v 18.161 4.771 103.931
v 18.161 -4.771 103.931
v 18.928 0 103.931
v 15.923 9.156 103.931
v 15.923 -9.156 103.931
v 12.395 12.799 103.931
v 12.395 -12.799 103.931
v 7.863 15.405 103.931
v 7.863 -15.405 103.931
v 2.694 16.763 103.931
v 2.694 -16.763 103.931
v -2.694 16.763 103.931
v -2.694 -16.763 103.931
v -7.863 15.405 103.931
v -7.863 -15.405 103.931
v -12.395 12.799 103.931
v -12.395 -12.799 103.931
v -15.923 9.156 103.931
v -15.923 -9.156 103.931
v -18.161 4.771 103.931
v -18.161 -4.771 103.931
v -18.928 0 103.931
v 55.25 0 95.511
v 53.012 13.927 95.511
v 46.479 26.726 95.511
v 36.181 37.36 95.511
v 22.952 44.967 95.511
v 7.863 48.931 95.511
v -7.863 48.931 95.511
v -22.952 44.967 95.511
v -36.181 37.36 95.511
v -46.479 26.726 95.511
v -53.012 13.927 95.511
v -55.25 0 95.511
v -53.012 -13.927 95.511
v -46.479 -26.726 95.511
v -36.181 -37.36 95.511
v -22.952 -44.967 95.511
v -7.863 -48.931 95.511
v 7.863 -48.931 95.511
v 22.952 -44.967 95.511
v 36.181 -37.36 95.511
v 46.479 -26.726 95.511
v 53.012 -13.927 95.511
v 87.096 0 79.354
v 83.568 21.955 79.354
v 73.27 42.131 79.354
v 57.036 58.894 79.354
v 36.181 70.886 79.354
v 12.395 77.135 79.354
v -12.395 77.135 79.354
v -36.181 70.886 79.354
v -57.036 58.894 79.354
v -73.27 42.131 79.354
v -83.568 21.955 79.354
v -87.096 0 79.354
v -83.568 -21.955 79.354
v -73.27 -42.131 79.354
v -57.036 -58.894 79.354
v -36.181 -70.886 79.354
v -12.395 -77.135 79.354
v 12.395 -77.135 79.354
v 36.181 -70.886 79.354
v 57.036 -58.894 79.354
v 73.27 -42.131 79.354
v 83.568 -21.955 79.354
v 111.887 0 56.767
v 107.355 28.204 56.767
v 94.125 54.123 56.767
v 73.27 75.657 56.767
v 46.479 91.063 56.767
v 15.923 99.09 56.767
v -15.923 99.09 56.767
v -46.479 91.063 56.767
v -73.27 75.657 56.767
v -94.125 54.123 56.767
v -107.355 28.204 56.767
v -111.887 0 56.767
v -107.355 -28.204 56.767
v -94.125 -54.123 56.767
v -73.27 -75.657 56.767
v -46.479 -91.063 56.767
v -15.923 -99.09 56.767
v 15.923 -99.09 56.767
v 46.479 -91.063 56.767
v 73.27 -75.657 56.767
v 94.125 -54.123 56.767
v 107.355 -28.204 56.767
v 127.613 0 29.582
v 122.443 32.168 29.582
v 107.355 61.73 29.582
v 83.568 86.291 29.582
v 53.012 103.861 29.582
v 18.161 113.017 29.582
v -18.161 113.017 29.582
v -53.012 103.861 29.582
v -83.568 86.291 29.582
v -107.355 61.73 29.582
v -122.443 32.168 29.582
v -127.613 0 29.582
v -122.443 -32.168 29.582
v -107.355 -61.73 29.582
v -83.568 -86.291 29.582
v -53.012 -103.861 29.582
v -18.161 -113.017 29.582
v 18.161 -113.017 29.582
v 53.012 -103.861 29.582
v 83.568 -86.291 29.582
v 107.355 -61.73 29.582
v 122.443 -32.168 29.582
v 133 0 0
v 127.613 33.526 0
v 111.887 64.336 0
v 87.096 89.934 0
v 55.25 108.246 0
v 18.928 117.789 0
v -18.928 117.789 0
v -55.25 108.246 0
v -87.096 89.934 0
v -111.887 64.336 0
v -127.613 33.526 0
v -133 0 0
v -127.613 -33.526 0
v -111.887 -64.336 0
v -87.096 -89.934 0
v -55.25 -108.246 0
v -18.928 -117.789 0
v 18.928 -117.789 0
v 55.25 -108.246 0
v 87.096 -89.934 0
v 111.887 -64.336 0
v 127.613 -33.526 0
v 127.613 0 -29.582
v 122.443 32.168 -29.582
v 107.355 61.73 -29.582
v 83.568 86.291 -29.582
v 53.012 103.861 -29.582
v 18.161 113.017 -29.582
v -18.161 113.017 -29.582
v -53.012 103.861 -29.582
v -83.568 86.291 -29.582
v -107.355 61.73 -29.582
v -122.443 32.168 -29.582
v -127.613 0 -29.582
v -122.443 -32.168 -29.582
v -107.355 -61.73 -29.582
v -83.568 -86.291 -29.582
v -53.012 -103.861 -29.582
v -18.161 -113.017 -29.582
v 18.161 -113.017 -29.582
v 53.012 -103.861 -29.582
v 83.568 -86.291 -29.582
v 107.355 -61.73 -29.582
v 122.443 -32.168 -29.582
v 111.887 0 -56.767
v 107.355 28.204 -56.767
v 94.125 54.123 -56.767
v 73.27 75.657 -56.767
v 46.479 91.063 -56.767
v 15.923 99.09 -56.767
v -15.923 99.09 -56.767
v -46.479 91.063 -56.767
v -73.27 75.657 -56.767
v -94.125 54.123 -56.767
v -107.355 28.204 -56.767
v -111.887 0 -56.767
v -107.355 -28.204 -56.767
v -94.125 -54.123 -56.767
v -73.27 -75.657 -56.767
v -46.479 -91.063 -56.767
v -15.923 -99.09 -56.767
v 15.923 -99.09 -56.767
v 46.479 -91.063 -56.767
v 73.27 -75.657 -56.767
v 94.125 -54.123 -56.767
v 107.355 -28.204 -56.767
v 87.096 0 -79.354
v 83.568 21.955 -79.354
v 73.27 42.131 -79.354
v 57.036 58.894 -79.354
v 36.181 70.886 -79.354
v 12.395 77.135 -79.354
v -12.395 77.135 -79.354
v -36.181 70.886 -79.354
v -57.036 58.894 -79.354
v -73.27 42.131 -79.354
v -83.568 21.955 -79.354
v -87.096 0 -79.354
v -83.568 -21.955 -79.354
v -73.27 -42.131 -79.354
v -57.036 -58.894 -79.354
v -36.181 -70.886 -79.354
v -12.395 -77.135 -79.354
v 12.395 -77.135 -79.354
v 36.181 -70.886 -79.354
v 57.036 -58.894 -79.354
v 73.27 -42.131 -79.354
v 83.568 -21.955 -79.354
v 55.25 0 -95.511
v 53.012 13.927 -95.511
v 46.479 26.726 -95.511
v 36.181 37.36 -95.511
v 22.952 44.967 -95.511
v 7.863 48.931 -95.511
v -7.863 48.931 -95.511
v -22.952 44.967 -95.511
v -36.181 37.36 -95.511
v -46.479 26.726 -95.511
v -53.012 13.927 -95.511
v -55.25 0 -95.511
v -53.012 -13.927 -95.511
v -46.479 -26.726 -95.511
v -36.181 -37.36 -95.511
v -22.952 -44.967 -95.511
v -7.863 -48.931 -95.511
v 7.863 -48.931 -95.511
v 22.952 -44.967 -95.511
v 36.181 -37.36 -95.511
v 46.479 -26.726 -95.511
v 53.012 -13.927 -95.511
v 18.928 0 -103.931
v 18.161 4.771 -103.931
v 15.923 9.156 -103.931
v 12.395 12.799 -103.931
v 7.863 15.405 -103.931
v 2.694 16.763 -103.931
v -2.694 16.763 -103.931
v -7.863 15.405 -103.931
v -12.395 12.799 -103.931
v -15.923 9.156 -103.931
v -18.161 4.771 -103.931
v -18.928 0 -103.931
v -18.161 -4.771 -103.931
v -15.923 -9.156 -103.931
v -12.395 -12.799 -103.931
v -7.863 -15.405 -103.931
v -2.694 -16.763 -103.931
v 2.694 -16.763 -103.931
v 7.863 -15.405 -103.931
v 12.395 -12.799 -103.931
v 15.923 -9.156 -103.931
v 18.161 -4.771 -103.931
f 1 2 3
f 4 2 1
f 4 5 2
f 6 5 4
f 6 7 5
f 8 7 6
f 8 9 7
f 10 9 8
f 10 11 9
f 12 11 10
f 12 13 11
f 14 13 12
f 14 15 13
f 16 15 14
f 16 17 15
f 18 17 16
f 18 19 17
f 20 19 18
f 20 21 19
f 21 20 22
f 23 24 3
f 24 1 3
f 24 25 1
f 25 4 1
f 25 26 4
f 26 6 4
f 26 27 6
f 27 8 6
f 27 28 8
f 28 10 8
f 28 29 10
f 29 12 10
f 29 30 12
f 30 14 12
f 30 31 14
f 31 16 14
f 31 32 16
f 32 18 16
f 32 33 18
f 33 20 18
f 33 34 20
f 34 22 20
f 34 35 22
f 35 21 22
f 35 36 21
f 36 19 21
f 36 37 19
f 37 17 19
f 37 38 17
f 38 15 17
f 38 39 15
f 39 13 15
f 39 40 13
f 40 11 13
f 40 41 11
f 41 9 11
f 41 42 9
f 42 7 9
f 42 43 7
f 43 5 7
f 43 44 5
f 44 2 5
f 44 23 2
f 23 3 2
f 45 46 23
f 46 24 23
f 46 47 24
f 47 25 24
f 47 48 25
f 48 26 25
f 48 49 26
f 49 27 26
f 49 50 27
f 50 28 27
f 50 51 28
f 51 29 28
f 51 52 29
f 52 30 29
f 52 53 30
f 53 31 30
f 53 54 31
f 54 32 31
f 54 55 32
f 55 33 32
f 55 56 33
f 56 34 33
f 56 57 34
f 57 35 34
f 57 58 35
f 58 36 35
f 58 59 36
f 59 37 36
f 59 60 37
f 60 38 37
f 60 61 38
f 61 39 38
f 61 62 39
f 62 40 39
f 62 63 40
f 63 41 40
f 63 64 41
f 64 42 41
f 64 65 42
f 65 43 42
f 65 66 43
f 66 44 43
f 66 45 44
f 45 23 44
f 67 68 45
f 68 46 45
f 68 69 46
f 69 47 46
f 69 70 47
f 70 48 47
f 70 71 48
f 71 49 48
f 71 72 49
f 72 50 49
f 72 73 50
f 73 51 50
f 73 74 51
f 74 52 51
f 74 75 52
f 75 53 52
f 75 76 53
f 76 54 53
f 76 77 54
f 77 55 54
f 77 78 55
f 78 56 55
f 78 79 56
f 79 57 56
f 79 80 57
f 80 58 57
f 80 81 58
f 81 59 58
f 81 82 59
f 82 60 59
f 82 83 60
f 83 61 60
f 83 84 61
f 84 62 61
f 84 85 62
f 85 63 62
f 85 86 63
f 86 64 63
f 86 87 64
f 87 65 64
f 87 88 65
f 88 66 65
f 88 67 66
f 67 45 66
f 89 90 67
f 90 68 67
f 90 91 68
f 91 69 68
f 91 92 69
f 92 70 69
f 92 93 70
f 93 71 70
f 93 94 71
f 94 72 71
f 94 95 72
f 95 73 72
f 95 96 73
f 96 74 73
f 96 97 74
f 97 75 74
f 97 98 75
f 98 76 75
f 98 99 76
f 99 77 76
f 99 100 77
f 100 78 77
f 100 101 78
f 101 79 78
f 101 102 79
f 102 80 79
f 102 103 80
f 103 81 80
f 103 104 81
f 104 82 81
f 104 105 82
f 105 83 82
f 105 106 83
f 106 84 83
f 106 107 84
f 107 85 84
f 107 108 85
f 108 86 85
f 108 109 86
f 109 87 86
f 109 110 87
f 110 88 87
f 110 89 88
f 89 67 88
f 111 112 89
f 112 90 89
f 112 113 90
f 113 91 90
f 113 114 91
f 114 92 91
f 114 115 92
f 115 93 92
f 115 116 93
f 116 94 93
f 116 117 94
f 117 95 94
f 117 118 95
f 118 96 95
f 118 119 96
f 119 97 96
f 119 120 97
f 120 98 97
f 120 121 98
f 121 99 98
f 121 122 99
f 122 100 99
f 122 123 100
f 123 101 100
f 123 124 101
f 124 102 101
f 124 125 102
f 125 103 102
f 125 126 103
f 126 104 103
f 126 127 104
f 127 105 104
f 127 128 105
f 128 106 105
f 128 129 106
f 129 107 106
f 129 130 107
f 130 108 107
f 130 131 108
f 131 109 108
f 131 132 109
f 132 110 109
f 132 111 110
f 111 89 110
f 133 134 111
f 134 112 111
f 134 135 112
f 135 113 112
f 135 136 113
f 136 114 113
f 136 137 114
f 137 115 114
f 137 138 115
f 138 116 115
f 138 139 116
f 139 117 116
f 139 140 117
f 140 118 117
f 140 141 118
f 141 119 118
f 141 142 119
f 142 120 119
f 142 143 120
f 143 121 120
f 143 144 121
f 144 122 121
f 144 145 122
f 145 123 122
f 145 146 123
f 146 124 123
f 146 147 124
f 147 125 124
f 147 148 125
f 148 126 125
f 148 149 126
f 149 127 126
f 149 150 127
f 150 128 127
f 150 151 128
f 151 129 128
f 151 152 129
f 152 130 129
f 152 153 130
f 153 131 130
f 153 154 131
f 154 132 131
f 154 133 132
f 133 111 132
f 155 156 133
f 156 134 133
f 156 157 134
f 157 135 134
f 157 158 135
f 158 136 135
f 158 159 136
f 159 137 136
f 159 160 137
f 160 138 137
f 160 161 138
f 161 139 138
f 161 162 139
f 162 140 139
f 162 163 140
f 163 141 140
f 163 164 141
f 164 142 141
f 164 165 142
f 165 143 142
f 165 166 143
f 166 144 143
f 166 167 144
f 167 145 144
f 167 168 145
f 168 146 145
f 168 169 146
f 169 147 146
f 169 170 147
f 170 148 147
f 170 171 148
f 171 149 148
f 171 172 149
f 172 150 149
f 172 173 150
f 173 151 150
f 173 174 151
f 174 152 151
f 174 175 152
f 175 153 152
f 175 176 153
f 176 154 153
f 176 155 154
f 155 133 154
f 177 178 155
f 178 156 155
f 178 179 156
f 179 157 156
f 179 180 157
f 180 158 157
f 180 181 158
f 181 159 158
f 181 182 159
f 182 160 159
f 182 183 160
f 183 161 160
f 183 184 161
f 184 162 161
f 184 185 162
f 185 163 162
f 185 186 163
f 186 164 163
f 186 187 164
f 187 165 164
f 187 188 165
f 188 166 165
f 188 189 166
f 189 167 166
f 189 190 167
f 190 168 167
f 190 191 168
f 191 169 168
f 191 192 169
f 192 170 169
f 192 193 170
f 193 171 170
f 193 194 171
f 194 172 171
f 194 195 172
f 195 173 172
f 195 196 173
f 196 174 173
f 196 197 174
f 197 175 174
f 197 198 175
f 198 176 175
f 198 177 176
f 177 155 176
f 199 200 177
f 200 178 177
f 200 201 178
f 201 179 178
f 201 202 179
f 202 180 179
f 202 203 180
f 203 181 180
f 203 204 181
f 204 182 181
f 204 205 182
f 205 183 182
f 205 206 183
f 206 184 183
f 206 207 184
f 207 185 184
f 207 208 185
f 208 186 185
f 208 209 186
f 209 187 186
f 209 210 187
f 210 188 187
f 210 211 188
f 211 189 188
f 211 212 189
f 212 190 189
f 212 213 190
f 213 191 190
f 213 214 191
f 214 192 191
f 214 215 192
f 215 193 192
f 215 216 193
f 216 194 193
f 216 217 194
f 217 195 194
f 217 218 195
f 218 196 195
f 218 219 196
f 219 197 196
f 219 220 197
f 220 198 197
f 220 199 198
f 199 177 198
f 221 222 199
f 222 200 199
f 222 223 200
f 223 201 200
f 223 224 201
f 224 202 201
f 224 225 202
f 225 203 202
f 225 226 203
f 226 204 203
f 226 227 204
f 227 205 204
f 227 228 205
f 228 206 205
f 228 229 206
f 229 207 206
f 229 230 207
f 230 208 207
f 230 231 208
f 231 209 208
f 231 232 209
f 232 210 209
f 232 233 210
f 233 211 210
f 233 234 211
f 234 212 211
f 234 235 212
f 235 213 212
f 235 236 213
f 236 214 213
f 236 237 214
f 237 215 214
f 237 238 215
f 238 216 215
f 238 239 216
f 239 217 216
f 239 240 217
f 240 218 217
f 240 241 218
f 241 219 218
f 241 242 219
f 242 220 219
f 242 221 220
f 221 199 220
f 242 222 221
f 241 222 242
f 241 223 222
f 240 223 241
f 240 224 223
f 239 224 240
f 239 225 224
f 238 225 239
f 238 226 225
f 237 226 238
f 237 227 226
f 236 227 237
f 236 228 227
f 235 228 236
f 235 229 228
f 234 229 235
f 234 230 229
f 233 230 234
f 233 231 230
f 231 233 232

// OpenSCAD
// Generated by SolidPython 1.0.1 on 2020-07-29 00:46:54


scale(v = [19, 17, 15]) {
	sphere(r = 7);
}
/***********************************************
*********      SolidPython code:      **********
************************************************
 
# import packages: SolidPython
from solid import *
from solid.utils import *
from itertools import chain, combinations, permutations


class Resize:

    def __init__(self, scad_file):
        self.scad_file = scad_file
        #self.scad_file = import_scad(scad_file)
        # cone/cylinder param:
        self.r1 = 0
        self.r2 = 0
        self.h = 0
        # rectangular prism param:
        self.w = 0
        self.l = 0
        # ellipse param:
        self.r = 0

    # import OpenScad code (file name corresponds to shape)


    # classify shape + parameters
    def assign(self, param1, param2, param3):
        if self.scad_file == 'cone.scad':
            self.r1 = param1
            self.r2 = param2
            self.h = param3
        elif self.scad_file == 'cylinder.scad':
            self.r1 = param1
            self.r2 = param2
            self.h = param3
        elif self.scad_file == 'rectangularPrism.scad':
            self.h = param1
            self.l = param2
            self.w = param3
        else:
            self.r = param1
            self.h = param2

    # resize parameters
    def iterate(self):
        x = range(3, 20, 2)
        i = 1
        if self.scad_file == 'cone.scad':
            tempList = list(permutations(x, 2))
            for temp in tempList:
                param1 = temp[0]
                param2 = temp[1]
                filepath = 'produced_scad_files/' + 'cone' + str(param1) + '_' + str(param2) + '_' + '.scad'
                scad_render_to_file(cylinder(h=param1, r1=param2, r2=0), filepath)

        elif self.scad_file == 'cylinder.scad':
            tempList = list(permutations(x, 3))
            for temp in tempList:
                param1 = temp[0]
                param2 = temp[1]
                filepath = 'produced_scad_files/' + 'cylinder' + str(param1) + '_' + str(param2) + '_' + '.scad'
                scad_render_to_file(cylinder(h=param1, r1=param2, r2=param2), filepath)

        elif self.scad_file == 'rectangularPrism.scad':
            tempList = list(permutations(x, 3))
            for temp in tempList:
                param1 = temp[0]
                param2 = temp[1]
                param3 = temp[2]
                filepath = 'produced_scad_files/' + 'rectangularPrism' + str(param1) + '_' + str(param2) + '_' + str(
                    param3) + '.scad'
                scad_render_to_file(cube(size=(param1, param2, param3)), filepath)

        elif self.scad_file == 'ellipse.scad':
            tempList = list(permutations(x, 4))
            for temp in tempList:
                param1 = temp[0]
                param2 = temp[1]
                param3 = temp[2]
                param4 = temp[3]
                filepath = 'produced_scad_files/' + 'ellipse' + str(param1) + '_' + str(param2) + '_' + str(param3) + '_' + str(param4) + '.scad'
                scad_render_to_file(scale([param1, param2, param3])(sphere(r=param4)), filepath)

    def render_to_scadfile(self):
        scad_render_to_file(scad, 'example.scad') 
 
************************************************/
